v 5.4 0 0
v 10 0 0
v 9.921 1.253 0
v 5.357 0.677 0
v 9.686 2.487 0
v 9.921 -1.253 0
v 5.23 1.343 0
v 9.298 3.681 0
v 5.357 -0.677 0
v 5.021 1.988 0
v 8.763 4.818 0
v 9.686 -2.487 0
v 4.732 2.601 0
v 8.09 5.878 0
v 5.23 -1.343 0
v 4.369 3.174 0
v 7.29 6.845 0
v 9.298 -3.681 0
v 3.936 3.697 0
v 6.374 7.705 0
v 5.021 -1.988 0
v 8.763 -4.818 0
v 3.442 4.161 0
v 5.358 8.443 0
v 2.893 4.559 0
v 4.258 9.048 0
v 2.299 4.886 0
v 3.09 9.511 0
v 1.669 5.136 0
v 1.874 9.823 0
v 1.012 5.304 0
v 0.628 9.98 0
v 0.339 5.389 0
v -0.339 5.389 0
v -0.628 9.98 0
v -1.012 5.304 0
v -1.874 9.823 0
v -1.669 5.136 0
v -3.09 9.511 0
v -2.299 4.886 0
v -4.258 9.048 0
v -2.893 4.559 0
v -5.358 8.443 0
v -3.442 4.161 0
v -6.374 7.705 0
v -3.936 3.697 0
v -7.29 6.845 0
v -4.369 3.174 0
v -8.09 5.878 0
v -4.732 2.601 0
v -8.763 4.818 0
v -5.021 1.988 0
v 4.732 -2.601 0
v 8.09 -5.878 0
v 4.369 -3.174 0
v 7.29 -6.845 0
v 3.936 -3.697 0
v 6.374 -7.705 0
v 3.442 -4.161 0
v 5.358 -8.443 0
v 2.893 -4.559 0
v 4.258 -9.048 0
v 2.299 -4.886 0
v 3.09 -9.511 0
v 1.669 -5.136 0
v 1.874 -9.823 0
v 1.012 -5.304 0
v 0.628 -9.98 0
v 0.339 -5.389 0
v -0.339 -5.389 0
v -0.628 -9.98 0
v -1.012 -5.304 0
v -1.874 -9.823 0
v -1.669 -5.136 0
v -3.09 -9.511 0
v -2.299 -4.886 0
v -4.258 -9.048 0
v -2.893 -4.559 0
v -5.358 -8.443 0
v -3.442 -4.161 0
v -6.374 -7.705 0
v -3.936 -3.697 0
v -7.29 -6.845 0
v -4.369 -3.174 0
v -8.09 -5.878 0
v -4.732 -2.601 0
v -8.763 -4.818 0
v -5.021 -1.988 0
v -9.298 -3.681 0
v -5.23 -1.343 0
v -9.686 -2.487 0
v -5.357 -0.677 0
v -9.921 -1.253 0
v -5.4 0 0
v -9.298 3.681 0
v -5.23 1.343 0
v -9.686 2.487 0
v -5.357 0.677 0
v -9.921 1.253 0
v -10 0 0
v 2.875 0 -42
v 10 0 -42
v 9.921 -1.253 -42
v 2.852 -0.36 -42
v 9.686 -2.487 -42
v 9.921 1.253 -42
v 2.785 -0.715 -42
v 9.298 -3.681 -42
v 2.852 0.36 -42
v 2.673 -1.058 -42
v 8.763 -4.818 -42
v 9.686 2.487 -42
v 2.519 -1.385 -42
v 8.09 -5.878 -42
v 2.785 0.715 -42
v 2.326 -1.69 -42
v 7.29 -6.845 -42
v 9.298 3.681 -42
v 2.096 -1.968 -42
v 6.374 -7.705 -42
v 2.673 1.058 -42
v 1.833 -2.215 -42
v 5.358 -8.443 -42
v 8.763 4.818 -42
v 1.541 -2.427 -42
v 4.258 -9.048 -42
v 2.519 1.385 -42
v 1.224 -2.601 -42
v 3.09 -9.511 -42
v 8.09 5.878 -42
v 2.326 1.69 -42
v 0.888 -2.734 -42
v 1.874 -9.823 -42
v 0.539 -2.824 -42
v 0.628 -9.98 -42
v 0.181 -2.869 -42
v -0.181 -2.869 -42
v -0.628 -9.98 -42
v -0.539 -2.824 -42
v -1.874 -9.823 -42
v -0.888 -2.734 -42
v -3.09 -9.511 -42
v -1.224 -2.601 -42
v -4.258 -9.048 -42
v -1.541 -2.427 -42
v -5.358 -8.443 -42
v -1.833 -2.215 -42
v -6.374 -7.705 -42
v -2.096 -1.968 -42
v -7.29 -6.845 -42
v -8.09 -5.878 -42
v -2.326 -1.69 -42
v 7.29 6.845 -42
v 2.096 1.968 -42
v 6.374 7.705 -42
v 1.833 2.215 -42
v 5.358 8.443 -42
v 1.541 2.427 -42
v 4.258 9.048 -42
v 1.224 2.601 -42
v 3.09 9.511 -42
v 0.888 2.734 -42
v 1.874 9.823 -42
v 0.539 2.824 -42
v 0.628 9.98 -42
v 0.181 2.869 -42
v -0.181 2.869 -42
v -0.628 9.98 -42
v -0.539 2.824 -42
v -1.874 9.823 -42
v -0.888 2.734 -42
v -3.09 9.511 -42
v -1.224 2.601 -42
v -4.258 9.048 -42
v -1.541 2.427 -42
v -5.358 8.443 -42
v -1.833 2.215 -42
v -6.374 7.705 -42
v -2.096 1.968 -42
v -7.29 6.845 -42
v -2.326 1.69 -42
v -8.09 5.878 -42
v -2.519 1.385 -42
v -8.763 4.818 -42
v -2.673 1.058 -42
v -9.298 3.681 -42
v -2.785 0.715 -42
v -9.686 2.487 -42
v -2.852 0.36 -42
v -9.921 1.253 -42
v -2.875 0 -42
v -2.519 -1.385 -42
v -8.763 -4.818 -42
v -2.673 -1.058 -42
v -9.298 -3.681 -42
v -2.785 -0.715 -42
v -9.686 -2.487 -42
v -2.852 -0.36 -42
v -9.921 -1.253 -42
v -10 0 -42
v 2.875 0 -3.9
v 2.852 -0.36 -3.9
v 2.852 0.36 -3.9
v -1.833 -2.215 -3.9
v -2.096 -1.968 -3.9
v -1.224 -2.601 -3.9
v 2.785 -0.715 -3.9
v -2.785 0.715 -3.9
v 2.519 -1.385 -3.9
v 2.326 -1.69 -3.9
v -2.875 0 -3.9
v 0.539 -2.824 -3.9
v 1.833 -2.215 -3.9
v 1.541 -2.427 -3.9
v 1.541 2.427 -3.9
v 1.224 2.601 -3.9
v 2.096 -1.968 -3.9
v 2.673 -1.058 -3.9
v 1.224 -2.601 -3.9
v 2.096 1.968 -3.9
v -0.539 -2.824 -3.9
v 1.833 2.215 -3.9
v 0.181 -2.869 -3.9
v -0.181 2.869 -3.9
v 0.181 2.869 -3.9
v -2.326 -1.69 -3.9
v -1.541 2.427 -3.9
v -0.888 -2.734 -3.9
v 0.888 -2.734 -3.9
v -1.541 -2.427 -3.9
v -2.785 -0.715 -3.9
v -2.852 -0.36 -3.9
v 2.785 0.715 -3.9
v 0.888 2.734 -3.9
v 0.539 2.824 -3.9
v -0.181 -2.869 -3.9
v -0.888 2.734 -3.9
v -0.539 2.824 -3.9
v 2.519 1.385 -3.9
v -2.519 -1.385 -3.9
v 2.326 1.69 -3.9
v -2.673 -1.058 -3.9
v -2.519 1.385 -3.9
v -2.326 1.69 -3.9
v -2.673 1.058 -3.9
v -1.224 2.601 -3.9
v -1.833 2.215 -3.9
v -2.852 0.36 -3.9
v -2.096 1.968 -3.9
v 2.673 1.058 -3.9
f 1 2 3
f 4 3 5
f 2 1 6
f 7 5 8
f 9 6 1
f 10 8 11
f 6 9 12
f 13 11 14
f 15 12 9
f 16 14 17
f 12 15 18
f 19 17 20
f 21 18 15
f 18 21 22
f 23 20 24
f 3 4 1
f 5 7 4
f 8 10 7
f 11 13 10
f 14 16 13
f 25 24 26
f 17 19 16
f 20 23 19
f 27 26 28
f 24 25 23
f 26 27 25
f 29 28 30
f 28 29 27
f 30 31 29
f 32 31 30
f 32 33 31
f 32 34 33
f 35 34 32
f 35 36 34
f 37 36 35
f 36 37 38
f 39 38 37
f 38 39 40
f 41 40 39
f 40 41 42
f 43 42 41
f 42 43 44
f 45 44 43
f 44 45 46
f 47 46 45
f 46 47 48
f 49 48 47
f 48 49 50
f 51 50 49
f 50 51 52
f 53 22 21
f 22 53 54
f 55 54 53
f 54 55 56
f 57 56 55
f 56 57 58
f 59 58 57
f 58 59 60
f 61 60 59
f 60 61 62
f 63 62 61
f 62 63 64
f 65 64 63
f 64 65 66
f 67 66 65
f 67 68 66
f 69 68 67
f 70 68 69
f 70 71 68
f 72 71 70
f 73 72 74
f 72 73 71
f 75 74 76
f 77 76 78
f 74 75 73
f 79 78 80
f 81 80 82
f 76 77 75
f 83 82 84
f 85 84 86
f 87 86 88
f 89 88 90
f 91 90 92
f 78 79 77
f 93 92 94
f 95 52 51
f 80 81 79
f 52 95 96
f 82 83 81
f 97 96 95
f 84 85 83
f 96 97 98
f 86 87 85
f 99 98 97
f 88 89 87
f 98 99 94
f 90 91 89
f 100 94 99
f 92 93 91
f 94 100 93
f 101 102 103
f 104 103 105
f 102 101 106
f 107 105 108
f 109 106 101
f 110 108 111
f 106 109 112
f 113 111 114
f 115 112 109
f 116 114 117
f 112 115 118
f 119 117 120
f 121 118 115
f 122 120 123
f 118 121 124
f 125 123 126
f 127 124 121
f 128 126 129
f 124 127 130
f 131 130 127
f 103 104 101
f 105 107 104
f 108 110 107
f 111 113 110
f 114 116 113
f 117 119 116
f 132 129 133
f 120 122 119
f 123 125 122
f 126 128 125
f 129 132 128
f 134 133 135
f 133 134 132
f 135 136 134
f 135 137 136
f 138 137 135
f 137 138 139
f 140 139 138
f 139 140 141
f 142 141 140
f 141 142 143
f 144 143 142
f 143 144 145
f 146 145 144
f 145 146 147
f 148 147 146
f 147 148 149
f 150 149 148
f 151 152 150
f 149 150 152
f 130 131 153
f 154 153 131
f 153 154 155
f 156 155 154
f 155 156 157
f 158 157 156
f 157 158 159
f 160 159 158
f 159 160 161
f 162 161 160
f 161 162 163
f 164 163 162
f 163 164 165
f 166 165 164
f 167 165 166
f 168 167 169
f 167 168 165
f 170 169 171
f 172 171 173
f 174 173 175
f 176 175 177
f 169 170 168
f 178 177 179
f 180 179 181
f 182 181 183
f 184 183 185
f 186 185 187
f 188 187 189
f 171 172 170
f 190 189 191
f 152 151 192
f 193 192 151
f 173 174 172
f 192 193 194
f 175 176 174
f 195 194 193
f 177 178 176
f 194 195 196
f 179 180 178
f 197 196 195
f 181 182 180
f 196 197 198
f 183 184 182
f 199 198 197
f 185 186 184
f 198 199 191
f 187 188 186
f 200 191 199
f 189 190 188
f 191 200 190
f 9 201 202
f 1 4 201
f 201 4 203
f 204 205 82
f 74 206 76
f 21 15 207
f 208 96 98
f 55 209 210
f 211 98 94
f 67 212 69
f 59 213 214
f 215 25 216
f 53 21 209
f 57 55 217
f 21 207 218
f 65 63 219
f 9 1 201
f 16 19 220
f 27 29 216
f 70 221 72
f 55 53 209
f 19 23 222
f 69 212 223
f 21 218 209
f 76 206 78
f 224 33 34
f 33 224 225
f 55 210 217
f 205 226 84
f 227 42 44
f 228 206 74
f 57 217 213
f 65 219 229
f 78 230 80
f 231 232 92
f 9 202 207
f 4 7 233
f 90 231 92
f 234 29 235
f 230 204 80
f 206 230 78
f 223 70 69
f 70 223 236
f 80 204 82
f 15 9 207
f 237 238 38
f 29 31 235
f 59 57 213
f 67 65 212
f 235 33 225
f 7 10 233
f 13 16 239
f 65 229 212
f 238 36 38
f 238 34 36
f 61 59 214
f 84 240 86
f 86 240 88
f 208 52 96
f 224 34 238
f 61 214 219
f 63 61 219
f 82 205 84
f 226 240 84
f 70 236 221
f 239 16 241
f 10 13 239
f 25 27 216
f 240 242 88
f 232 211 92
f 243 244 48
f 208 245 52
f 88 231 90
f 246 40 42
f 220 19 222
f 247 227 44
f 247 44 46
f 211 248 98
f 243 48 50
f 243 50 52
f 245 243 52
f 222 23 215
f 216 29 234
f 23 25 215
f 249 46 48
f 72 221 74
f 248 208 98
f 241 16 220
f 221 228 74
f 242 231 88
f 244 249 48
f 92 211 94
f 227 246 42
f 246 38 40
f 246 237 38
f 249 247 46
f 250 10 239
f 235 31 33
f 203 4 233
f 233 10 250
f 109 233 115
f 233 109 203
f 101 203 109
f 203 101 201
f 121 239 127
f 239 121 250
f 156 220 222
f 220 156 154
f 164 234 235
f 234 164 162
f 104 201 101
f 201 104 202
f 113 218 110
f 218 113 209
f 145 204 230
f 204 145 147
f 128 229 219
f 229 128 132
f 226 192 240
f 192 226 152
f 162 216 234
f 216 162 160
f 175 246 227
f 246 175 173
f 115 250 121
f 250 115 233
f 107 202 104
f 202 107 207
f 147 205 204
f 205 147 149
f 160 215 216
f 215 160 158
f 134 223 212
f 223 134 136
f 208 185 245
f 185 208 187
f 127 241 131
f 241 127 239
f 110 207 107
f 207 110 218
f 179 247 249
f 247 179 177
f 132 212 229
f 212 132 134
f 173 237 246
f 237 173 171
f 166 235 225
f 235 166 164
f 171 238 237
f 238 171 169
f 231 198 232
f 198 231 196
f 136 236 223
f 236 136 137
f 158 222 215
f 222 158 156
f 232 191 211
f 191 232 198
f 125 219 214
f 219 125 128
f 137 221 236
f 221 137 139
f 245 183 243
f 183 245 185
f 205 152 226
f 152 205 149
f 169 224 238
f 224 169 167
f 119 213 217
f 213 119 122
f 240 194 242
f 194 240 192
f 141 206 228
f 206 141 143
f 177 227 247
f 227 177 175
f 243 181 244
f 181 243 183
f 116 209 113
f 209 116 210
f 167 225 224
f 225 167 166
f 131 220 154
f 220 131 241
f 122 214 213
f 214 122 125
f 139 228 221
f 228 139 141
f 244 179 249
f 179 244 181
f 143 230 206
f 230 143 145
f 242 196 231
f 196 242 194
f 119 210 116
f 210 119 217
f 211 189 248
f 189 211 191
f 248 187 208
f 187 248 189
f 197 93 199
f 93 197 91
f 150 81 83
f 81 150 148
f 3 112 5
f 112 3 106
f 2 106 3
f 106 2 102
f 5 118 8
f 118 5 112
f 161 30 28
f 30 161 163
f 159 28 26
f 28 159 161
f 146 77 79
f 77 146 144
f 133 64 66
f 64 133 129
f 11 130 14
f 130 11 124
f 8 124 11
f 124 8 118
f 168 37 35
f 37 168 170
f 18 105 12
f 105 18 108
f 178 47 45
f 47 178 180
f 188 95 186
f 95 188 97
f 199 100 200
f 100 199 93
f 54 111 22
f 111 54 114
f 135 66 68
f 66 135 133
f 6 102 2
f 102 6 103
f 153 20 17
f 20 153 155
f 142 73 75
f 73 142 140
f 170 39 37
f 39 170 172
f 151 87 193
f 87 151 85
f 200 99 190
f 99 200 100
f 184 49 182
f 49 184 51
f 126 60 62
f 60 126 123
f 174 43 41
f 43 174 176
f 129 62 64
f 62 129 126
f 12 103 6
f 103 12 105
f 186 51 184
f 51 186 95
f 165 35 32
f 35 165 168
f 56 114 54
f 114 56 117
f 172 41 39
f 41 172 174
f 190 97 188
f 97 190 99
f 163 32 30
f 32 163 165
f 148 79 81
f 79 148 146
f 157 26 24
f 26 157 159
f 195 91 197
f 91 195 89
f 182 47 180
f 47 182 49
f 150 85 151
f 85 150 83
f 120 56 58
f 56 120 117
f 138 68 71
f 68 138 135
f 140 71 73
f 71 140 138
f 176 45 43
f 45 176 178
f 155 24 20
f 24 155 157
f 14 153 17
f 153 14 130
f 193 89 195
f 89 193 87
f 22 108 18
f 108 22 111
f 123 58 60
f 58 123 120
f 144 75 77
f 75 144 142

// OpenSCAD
$fn = 50;


difference() {
	union() {
		translate(v = [0, 0, -42.0000000000]) {
			cylinder(h = 42, r = 10.0000000000);
		}
	}
	union() {
		translate(v = [0, 0, 0]) {
			rotate(a = [0, 0, 0]) {
				difference() {
					union() {
						#translate(v = [0, 0, -42.0000000000]) {
							cylinder(h = 42, r = 2.6000000000);
						}
						#translate(v = [0, 0, -3.9000000000]) {
							cylinder(h = 3.9000000000, r = 10.0000000000, r1 = 2.8750000000, r2 = 5.4000000000);
						}
						#translate(v = [0, 0, -42.0000000000]) {
							cylinder(h = 42, r = 2.8750000000);
						}
						#translate(v = [0, 0, -42.0000000000]) {
							cylinder(h = 42, r = 2.6000000000);
						}
					}
					union();
				}
			}
		}
	}
}
